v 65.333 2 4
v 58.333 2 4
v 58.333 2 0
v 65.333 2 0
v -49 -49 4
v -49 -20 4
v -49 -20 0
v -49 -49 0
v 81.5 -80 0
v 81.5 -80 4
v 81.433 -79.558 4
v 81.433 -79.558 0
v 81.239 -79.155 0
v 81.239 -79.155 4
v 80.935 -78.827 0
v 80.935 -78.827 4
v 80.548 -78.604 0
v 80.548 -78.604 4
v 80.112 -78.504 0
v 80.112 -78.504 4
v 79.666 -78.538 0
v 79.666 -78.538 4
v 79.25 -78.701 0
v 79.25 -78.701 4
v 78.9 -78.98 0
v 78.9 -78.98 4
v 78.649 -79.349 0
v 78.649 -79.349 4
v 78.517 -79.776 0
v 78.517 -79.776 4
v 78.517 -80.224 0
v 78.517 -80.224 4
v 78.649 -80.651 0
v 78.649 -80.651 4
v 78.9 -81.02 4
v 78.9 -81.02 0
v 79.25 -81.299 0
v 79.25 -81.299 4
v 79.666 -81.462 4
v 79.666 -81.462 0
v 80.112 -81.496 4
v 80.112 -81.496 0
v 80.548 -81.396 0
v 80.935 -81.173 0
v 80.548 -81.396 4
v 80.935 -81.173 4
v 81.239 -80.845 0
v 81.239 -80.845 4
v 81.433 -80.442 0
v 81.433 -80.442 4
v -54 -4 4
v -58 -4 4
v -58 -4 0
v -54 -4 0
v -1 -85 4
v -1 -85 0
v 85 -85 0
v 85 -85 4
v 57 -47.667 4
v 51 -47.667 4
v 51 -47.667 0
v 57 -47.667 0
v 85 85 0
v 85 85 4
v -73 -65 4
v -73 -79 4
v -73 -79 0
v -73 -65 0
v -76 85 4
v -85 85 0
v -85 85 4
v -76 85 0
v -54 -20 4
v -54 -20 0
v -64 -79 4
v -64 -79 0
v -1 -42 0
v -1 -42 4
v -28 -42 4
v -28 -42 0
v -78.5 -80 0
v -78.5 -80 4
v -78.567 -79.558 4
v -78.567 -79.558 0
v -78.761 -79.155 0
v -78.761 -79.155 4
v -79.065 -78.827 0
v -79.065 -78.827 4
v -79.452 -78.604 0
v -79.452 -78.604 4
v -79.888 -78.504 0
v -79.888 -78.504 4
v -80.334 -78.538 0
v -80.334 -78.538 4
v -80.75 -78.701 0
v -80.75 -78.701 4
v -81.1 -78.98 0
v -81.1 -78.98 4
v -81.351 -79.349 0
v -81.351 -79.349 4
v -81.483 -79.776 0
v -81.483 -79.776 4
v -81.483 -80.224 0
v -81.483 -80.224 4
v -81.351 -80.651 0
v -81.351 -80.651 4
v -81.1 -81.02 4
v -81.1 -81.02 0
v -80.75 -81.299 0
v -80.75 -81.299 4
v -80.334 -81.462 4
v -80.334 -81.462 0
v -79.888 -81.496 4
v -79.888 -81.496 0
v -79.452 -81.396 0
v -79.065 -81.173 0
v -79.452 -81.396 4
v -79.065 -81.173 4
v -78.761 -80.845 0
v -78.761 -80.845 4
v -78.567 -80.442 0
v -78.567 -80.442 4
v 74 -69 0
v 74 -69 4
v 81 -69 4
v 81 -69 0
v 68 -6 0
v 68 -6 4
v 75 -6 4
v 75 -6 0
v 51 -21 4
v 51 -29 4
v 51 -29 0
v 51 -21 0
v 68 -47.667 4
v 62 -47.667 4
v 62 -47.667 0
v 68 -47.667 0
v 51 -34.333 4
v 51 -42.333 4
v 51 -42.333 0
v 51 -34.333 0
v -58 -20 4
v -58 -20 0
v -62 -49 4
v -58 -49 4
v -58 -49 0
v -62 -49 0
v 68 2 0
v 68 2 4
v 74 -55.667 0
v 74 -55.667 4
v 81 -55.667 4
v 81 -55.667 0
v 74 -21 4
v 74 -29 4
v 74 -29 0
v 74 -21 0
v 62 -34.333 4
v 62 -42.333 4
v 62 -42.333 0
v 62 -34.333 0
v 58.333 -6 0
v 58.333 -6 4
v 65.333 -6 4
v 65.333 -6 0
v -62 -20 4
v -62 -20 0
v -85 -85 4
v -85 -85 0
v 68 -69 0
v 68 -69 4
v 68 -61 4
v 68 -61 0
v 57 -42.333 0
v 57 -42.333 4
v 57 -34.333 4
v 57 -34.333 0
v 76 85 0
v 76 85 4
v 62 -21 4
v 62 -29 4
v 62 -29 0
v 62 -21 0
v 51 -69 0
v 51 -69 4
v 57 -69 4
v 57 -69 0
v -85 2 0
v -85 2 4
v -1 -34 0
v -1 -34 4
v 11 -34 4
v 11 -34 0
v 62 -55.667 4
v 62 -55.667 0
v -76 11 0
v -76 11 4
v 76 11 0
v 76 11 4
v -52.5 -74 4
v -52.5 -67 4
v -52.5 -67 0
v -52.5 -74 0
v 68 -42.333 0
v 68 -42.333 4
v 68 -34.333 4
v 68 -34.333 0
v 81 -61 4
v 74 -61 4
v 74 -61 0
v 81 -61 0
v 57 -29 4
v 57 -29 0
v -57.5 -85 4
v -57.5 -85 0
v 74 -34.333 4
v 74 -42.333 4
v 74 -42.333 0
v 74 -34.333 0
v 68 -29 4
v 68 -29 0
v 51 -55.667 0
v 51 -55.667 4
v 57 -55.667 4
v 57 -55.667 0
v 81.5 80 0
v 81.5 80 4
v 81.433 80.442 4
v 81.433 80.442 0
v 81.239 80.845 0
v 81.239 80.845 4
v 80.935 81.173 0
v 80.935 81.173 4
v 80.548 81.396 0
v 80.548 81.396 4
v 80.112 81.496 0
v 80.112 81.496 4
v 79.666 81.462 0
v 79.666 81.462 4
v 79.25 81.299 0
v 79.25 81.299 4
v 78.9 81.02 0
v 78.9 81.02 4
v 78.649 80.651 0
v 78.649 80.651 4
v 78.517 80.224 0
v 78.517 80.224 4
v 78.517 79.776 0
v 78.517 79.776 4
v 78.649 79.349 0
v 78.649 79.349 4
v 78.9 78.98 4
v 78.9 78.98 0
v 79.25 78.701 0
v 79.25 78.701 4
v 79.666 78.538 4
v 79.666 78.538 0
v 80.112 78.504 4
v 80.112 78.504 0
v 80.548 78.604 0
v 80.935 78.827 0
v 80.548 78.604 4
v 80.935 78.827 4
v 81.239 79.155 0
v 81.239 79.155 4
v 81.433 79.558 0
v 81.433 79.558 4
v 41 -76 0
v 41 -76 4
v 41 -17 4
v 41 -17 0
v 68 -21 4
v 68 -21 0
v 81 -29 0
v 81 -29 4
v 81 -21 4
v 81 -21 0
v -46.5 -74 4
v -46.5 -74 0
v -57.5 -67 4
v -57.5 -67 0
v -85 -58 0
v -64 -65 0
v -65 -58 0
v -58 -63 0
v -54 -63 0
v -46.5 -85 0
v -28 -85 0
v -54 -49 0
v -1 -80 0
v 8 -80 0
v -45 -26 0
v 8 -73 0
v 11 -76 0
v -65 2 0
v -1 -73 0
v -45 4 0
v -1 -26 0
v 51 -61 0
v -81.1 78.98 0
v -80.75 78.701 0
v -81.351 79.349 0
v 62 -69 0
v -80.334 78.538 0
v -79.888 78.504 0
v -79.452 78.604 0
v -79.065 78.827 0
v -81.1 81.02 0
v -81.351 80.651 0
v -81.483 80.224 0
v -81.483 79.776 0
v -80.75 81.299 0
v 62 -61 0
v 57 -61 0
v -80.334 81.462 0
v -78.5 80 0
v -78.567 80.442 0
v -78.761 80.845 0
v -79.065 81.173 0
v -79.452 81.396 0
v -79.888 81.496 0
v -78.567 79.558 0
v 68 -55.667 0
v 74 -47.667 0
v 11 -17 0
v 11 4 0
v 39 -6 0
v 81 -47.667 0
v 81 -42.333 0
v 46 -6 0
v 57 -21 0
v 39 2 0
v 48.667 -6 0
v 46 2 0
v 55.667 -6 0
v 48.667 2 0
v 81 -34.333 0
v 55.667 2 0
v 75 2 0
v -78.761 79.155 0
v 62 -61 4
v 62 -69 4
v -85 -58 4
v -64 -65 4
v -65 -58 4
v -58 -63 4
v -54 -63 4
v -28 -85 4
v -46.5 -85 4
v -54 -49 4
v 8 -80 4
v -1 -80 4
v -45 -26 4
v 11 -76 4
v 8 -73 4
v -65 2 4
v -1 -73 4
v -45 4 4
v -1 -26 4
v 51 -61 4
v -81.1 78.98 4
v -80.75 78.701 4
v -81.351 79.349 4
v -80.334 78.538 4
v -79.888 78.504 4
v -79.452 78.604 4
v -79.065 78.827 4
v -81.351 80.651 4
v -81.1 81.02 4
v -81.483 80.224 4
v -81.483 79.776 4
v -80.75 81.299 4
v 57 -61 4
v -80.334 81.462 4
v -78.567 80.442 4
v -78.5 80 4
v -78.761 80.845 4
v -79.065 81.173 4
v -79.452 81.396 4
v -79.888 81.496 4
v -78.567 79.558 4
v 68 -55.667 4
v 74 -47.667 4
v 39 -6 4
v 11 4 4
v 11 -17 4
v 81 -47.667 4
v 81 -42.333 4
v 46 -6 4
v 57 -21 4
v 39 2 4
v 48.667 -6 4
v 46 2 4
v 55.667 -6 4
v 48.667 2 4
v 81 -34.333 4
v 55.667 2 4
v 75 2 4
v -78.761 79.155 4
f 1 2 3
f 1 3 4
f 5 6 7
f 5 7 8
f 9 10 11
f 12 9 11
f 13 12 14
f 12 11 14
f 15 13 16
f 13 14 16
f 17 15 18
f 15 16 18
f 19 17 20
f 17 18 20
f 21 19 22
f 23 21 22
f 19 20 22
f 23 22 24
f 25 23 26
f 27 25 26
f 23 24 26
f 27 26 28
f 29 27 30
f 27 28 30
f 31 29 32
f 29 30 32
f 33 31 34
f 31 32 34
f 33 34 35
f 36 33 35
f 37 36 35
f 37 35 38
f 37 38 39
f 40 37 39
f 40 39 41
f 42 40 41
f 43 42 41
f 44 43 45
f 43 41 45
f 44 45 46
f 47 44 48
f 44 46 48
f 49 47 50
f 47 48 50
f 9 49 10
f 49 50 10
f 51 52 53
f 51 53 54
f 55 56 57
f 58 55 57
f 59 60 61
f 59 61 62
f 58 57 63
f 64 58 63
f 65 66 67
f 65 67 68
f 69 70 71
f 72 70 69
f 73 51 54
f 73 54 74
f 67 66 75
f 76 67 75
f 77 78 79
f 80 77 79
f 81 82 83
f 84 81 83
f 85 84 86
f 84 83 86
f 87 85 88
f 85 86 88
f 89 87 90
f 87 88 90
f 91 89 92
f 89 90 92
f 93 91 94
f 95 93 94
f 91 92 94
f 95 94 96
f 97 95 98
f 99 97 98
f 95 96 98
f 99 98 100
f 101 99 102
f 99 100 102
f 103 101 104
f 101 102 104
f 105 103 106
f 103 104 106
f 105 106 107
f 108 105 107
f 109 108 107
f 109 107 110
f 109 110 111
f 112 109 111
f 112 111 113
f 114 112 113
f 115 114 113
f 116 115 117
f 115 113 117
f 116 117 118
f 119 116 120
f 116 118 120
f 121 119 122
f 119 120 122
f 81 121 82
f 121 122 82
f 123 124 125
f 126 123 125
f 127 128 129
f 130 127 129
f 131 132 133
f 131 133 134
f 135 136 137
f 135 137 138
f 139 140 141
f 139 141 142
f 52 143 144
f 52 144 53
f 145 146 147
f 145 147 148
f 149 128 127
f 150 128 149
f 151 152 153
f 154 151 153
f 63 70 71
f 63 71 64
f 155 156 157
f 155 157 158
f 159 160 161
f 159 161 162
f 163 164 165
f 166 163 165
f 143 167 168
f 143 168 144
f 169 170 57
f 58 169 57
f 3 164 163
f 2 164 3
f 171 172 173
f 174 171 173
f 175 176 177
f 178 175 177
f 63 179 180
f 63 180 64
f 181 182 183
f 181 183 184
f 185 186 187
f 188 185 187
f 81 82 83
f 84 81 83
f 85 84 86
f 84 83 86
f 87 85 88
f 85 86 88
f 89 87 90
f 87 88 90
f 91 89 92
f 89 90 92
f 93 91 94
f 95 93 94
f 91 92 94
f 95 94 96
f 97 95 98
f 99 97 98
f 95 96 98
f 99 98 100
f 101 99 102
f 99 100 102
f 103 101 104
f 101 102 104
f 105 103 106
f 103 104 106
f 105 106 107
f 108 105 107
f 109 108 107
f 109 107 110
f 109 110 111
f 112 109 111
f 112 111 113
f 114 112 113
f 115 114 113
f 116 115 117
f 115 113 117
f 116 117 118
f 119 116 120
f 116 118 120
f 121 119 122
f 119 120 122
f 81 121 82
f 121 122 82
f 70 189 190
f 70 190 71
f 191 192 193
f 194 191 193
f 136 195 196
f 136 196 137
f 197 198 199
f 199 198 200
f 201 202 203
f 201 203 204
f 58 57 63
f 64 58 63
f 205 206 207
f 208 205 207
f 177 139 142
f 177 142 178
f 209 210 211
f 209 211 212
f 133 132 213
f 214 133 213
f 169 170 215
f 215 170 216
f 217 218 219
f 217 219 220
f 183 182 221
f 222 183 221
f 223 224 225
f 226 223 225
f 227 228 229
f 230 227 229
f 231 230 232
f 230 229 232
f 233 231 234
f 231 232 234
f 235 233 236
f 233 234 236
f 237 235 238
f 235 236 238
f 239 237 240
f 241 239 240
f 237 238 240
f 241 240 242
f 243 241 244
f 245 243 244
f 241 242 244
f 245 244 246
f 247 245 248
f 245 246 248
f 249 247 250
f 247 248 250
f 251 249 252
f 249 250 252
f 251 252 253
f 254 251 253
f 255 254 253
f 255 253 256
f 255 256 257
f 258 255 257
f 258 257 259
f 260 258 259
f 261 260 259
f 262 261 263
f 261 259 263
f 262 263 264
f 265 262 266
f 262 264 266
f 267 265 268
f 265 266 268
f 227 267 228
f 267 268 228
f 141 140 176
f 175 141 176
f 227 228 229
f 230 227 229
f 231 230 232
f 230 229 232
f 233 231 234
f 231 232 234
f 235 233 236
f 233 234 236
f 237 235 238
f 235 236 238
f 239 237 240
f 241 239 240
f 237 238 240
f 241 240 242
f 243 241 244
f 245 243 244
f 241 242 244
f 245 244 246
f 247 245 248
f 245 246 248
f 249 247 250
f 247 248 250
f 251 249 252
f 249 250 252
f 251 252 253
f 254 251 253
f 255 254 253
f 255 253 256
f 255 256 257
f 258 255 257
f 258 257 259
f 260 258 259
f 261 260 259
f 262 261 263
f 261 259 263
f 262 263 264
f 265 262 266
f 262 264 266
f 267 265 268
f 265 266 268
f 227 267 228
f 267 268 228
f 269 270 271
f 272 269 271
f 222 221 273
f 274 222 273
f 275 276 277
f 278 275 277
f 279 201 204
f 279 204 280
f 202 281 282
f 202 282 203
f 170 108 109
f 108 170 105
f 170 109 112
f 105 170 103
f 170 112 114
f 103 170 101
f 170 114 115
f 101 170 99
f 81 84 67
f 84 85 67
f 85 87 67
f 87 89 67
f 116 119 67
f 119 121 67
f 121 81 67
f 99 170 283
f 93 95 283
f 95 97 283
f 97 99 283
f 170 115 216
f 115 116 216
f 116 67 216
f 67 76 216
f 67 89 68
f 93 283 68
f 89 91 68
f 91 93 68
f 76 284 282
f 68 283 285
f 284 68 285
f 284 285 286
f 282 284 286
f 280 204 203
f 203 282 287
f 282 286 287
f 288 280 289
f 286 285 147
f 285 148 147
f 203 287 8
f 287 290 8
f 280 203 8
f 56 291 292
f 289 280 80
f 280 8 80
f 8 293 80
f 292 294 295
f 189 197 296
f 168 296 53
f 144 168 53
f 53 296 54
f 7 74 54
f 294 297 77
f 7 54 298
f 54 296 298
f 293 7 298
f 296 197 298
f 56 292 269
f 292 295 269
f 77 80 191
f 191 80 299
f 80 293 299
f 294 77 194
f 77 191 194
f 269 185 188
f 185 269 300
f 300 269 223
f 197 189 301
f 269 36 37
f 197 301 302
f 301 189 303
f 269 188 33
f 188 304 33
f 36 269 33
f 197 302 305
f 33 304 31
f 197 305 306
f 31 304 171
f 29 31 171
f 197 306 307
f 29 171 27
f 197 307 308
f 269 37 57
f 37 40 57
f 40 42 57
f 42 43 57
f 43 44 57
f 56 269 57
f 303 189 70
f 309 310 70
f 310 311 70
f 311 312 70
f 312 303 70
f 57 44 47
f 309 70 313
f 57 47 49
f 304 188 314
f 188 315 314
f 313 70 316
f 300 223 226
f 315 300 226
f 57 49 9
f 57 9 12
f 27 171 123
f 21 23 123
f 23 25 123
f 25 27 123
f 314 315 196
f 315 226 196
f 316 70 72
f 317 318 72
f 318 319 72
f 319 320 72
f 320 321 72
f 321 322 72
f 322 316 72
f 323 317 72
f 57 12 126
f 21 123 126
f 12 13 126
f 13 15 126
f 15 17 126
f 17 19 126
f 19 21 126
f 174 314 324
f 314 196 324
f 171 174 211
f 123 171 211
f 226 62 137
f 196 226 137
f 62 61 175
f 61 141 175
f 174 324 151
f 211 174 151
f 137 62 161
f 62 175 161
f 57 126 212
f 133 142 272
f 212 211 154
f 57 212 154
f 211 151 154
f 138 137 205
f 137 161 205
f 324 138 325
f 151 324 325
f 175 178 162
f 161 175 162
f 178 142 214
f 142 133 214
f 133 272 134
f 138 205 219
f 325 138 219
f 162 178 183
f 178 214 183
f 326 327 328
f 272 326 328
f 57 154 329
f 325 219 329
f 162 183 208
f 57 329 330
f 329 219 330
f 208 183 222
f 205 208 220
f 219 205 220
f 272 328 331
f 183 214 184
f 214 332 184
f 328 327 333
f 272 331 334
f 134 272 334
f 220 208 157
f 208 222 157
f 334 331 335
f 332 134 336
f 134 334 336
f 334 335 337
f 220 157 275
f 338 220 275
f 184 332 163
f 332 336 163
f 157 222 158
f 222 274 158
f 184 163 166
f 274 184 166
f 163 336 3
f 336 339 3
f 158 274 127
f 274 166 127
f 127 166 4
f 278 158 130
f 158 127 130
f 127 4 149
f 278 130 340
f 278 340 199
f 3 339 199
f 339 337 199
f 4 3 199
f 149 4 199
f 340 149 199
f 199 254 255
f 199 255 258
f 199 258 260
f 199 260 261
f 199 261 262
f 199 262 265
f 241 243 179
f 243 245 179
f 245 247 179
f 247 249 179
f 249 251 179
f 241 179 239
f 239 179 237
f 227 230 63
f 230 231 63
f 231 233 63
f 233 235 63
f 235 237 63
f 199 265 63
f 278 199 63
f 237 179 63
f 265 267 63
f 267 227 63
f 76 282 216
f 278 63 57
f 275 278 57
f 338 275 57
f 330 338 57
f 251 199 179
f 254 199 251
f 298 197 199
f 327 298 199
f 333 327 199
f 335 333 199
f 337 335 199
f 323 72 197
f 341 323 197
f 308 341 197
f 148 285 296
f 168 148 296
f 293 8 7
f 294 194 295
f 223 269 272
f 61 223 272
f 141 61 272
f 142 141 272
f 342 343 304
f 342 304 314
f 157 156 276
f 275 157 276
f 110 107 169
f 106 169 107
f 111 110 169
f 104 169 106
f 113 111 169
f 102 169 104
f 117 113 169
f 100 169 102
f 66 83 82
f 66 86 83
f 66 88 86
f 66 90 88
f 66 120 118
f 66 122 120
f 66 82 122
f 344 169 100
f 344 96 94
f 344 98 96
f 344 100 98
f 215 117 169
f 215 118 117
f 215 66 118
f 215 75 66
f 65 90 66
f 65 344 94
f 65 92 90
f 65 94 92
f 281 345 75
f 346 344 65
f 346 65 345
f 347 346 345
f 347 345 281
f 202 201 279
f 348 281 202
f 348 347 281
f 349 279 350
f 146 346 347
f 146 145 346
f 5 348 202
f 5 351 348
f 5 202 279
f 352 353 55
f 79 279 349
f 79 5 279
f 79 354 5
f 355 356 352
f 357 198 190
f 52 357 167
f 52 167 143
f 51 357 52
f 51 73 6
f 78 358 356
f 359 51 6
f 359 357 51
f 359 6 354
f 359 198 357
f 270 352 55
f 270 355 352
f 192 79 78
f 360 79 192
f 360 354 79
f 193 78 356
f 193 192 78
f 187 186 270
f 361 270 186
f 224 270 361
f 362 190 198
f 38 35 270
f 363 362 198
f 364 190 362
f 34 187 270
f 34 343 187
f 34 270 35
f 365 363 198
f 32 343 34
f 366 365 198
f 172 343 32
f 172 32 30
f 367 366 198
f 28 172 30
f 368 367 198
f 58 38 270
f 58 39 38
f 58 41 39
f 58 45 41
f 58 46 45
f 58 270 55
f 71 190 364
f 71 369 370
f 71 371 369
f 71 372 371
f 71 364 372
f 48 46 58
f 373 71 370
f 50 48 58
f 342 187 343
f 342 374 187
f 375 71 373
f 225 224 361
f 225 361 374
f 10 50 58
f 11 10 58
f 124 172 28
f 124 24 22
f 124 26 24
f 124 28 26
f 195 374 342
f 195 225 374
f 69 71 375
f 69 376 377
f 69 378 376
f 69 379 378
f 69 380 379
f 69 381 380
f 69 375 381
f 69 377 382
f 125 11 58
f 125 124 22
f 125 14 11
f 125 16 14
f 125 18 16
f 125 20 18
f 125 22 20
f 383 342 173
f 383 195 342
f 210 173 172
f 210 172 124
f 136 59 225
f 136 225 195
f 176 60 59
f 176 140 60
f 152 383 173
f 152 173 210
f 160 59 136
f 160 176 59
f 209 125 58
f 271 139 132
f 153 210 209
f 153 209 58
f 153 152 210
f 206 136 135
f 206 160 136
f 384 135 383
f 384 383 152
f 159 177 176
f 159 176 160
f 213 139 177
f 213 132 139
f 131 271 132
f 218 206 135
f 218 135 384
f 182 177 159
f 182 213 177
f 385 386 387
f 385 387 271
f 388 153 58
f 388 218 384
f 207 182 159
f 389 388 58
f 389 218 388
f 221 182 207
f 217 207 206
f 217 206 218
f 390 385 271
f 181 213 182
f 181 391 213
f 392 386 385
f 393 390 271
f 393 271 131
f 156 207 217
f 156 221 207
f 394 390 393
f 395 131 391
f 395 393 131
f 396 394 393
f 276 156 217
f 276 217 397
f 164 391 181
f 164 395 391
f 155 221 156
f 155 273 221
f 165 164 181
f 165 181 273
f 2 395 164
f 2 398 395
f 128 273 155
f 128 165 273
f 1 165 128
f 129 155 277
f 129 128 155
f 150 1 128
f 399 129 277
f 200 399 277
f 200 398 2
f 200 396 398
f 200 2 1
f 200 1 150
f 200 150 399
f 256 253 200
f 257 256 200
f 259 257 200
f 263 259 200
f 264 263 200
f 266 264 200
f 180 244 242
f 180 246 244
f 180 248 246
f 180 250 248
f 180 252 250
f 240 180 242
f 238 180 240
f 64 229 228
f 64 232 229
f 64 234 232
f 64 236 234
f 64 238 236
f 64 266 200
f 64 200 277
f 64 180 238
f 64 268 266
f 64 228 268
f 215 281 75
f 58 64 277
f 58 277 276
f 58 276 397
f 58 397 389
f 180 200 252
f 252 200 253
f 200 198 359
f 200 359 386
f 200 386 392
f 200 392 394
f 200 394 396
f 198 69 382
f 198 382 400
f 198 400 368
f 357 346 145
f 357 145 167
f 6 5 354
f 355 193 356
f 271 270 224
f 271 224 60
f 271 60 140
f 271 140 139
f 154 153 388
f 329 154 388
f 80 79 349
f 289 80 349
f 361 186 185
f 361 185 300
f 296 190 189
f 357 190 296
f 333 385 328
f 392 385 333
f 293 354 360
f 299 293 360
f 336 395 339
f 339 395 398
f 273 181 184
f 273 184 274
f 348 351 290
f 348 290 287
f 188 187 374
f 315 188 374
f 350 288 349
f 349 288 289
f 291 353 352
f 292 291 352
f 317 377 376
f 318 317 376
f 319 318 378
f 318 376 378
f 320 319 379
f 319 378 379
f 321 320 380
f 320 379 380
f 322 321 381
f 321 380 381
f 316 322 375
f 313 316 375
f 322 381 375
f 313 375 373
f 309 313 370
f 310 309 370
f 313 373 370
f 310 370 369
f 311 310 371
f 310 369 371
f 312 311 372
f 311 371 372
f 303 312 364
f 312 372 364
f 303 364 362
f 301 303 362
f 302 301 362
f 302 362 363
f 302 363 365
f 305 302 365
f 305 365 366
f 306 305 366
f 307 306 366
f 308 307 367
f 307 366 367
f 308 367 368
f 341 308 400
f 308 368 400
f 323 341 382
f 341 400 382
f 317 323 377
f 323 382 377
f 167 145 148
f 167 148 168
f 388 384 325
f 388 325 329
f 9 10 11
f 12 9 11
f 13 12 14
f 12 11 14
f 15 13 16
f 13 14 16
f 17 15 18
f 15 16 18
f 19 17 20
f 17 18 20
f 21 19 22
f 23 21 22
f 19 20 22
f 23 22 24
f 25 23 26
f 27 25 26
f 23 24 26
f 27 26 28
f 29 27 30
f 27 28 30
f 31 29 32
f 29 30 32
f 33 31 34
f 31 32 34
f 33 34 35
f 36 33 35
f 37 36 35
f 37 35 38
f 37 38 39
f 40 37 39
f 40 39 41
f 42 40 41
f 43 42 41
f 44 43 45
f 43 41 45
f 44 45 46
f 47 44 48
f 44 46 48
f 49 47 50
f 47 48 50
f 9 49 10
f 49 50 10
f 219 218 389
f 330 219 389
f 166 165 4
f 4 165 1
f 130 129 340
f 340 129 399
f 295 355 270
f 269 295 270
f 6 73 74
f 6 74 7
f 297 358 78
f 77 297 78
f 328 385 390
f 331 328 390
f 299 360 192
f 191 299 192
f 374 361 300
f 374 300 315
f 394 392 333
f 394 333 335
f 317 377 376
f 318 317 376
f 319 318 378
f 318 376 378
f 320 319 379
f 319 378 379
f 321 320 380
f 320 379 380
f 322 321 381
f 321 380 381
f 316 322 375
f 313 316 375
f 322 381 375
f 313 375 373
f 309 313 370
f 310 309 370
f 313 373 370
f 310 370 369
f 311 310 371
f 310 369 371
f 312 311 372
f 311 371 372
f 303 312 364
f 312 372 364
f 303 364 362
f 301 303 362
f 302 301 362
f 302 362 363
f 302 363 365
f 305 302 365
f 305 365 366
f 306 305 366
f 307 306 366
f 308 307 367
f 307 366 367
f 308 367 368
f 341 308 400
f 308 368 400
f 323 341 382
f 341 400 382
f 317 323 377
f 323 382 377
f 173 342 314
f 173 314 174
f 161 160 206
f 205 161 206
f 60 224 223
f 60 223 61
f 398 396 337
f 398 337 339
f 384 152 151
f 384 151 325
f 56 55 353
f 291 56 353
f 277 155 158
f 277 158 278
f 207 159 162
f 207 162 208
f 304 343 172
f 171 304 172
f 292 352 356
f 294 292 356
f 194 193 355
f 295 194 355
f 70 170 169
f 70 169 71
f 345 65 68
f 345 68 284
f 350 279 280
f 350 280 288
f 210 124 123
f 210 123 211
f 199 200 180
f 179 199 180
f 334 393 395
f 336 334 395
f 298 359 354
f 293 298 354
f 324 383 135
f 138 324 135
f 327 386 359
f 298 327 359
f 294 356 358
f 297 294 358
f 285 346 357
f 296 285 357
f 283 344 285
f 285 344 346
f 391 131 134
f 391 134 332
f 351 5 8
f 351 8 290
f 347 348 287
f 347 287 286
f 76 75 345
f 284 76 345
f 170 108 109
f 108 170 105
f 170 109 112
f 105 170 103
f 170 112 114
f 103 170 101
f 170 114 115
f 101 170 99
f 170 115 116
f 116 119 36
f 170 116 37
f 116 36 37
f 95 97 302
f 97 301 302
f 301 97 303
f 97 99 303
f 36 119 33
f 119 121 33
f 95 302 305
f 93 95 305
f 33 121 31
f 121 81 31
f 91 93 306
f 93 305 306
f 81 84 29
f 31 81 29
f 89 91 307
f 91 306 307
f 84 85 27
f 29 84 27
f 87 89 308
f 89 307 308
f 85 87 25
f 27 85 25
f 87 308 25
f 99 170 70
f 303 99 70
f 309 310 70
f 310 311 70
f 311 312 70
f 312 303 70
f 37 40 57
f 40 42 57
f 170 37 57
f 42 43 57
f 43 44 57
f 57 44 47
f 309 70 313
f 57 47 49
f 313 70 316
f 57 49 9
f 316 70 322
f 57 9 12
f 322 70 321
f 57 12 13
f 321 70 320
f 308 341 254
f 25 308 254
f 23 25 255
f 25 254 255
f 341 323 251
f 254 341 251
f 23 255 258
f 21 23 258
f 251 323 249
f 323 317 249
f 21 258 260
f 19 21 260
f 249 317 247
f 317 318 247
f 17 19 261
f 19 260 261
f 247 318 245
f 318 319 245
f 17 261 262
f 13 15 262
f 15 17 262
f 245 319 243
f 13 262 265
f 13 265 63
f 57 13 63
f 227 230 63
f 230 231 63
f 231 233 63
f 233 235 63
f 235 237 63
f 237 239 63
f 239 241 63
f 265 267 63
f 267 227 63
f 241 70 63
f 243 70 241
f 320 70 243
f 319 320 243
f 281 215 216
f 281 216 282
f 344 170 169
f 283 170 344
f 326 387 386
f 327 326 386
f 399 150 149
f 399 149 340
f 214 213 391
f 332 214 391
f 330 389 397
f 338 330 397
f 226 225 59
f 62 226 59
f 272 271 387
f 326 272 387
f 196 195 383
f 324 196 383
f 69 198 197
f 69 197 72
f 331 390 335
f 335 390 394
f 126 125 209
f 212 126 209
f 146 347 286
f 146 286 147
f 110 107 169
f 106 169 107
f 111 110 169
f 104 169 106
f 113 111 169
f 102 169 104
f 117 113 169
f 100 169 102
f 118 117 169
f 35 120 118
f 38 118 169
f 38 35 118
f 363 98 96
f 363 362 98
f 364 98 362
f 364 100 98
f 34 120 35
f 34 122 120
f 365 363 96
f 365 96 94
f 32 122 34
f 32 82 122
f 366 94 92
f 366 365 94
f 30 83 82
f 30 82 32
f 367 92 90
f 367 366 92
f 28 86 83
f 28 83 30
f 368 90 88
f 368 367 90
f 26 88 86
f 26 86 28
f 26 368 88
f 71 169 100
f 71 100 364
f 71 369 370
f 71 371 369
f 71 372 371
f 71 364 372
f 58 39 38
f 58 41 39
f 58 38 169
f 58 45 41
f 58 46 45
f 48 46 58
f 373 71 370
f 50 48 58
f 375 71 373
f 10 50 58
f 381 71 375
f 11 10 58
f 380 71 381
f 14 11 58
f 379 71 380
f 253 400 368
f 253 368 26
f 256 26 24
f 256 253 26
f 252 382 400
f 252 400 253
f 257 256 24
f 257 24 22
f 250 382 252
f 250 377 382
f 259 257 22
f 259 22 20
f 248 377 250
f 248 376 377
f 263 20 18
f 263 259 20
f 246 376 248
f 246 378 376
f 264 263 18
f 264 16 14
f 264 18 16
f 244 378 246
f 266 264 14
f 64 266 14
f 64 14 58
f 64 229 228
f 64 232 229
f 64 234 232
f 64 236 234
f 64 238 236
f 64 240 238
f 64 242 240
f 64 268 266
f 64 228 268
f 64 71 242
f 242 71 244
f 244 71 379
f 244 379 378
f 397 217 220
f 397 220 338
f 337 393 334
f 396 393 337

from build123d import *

# Parameters (mm, degrees)
SKETCH_W        = 170
SKETCH_H        = 170
PAD_DEPTH       = 4
SKETCH001_R     = 1.5
POCKET_DEPTH    = 4
SKETCH002_W     = 170
SKETCH002_H     = 170
PAD001_DEPTH    = 4
SKETCH003_R     = 1.5
POCKET001_DEPTH = 4
SKETCH004_W     = 152
SKETCH004_H     = 74
POCKET002_DEPTH = 4
SKETCH005_W     = 20
SKETCH005_H     = 60
POCKET003_DEPTH = 4
SKETCH006_W     = 9
SKETCH006_H     = 14
POCKET004_DEPTH = 4
POCKET005_DEPTH = 4
POCKET006_DEPTH = 4
POCKET007_DEPTH = 4
POCKET008_DEPTH = 4
SKETCH011_W     = 7
SKETCH011_H     = 8
POCKET009_DEPTH = 4
SKETCH012_W     = 6
SKETCH012_H     = 8
POCKET010_DEPTH = 4
SKETCH013_W     = 7
SKETCH013_H     = 8
POCKET011_DEPTH = 4


with BuildPart() as bottom:
    # Sketch → Pad (new body)
    with BuildSketch(Plane.XY):
        Rectangle(SKETCH_W, SKETCH_H)
    extrude(amount=PAD_DEPTH)

    # Sketch001 (on Face6 of Pad) → Pocket (cut)
    with BuildSketch(Plane.XY.offset(4)):
        with Locations((-80, 80)):
            Circle(SKETCH001_R)
        with Locations((80, 80)):
            Circle(SKETCH001_R)
        with Locations((80, -80)):
            Circle(SKETCH001_R)
        with Locations((-80, -80)):
            Circle(SKETCH001_R)
    extrude(amount=-POCKET_DEPTH, mode=Mode.SUBTRACT)


with BuildPart() as top:
    # Sketch002 → Pad001 (new body)
    with BuildSketch(Plane.XY):
        Rectangle(SKETCH002_W, SKETCH002_H)
    extrude(amount=PAD001_DEPTH)

    # Sketch003 (on Face6 of Pad001) → Pocket001 (cut)
    with BuildSketch(Plane.XY.offset(4)):
        with Locations((-80, 80)):
            Circle(SKETCH003_R)
        with Locations((80, 80)):
            Circle(SKETCH003_R)
        with Locations((80, -80)):
            Circle(SKETCH003_R)
        with Locations((-80, -80)):
            Circle(SKETCH003_R)
    extrude(amount=-POCKET001_DEPTH, mode=Mode.SUBTRACT)

    # Sketch004 (on Face5 of Pocket001) → Pocket002 (cut)
    with BuildSketch(Plane.XY.offset(4)):
        with Locations((0, 48)):
            Rectangle(SKETCH004_W, SKETCH004_H)
    extrude(amount=-POCKET002_DEPTH, mode=Mode.SUBTRACT)

    # Sketch005 (on Face4 of Pocket002) → Pocket003 (cut)
    with BuildSketch(Plane.XY.offset(4)):
        with Locations((-75, -28)):
            Rectangle(SKETCH005_W, SKETCH005_H)
    extrude(amount=-POCKET003_DEPTH, mode=Mode.SUBTRACT)

    # Sketch006 (on Face4 of Pocket003) → Pocket004 (cut)
    with BuildSketch(Plane.XY.offset(4)):
        with Locations((-68.5, -72)):
            Rectangle(SKETCH006_W, SKETCH006_H)
    extrude(amount=-POCKET004_DEPTH, mode=Mode.SUBTRACT)

    # Sketch007 (on Face4 of Pocket004) → Pocket005 (cut)
    with BuildSketch(Plane.XY.offset(4)):
        Polygon((11, -76), (41, -76), (41, -17), (11, -17), (11, 4), (-45, 4), (-45, -26), (-1, -26), (-1, -34), (11, -34), align=None)
    extrude(amount=-POCKET005_DEPTH, mode=Mode.SUBTRACT)

    # Sketch008 (on Face4 of Pocket005) → Pocket006 (cut)
    with BuildSketch(Plane.XY.offset(4)):
        Polygon((-28, -85), (-1, -85), (-1, -80), (8, -80), (8, -73), (-1, -73), (-1, -42), (-28, -42), align=None)
    extrude(amount=-POCKET006_DEPTH, mode=Mode.SUBTRACT)

    # Sketch009 (on Face4 of Pocket006) → Pocket007 (cut)
    with BuildSketch(Plane.XY.offset(4)):
        Polygon((-46.5, -85), (-57.5, -85), (-57.5, -67), (-52.5, -67), (-52.5, -74), (-46.5, -74), align=None)
    extrude(amount=-POCKET007_DEPTH, mode=Mode.SUBTRACT)

    # Sketch010 (on Face4 of Pocket007) → Pocket008 (cut)
    with BuildSketch(Plane.XY.offset(4)):
        Polygon((-58, -4), (-54, -4), (-54, -20), (-49, -20), (-49, -49), (-54, -49), (-54, -63), (-58, -63), (-58, -49), (-62, -49), (-62, -20), (-58, -20), align=None)
    extrude(amount=-POCKET008_DEPTH, mode=Mode.SUBTRACT)

    # Sketch011 (on Face4 of Pocket008) → Pocket009 (cut)
    with BuildSketch(Plane.XY.offset(4)):
        with Locations((71.5, -2)):
            Rectangle(SKETCH011_W, SKETCH011_H)
        with Locations((61.833333, -2)):
            Rectangle(SKETCH011_W, SKETCH011_H)
        with Locations((52.166667, -2)):
            Rectangle(SKETCH011_W, SKETCH011_H)
        with Locations((42.5, -2)):
            Rectangle(SKETCH011_W, SKETCH011_H)
    extrude(amount=-POCKET009_DEPTH, mode=Mode.SUBTRACT)

    # Sketch012 (on Face4 of Pocket009) → Pocket010 (cut)
    with BuildSketch(Plane.XY.offset(4)):
        with Locations((54, -25)):
            Rectangle(SKETCH012_W, SKETCH012_H)
        with Locations((54, -38.333333)):
            Rectangle(SKETCH012_W, SKETCH012_H)
        with Locations((54, -51.666667)):
            Rectangle(SKETCH012_W, SKETCH012_H)
        with Locations((54, -65)):
            Rectangle(SKETCH012_W, SKETCH012_H)
        with Locations((65, -25)):
            Rectangle(SKETCH012_W, SKETCH012_H)
        with Locations((65, -38.333333)):
            Rectangle(SKETCH012_W, SKETCH012_H)
        with Locations((65, -51.666667)):
            Rectangle(SKETCH012_W, SKETCH012_H)
        with Locations((65, -65)):
            Rectangle(SKETCH012_W, SKETCH012_H)
    extrude(amount=-POCKET010_DEPTH, mode=Mode.SUBTRACT)

    # Sketch013 (on Face4 of Pocket010) → Pocket011 (cut)
    with BuildSketch(Plane.XY.offset(4)):
        with Locations((77.5, -25)):
            Rectangle(SKETCH013_W, SKETCH013_H)
        with Locations((77.5, -38.333333)):
            Rectangle(SKETCH013_W, SKETCH013_H)
        with Locations((77.5, -51.666667)):
            Rectangle(SKETCH013_W, SKETCH013_H)
        with Locations((77.5, -65)):
            Rectangle(SKETCH013_W, SKETCH013_H)
    extrude(amount=-POCKET011_DEPTH, mode=Mode.SUBTRACT)


solid = Compound([bottom.part, top.part])
